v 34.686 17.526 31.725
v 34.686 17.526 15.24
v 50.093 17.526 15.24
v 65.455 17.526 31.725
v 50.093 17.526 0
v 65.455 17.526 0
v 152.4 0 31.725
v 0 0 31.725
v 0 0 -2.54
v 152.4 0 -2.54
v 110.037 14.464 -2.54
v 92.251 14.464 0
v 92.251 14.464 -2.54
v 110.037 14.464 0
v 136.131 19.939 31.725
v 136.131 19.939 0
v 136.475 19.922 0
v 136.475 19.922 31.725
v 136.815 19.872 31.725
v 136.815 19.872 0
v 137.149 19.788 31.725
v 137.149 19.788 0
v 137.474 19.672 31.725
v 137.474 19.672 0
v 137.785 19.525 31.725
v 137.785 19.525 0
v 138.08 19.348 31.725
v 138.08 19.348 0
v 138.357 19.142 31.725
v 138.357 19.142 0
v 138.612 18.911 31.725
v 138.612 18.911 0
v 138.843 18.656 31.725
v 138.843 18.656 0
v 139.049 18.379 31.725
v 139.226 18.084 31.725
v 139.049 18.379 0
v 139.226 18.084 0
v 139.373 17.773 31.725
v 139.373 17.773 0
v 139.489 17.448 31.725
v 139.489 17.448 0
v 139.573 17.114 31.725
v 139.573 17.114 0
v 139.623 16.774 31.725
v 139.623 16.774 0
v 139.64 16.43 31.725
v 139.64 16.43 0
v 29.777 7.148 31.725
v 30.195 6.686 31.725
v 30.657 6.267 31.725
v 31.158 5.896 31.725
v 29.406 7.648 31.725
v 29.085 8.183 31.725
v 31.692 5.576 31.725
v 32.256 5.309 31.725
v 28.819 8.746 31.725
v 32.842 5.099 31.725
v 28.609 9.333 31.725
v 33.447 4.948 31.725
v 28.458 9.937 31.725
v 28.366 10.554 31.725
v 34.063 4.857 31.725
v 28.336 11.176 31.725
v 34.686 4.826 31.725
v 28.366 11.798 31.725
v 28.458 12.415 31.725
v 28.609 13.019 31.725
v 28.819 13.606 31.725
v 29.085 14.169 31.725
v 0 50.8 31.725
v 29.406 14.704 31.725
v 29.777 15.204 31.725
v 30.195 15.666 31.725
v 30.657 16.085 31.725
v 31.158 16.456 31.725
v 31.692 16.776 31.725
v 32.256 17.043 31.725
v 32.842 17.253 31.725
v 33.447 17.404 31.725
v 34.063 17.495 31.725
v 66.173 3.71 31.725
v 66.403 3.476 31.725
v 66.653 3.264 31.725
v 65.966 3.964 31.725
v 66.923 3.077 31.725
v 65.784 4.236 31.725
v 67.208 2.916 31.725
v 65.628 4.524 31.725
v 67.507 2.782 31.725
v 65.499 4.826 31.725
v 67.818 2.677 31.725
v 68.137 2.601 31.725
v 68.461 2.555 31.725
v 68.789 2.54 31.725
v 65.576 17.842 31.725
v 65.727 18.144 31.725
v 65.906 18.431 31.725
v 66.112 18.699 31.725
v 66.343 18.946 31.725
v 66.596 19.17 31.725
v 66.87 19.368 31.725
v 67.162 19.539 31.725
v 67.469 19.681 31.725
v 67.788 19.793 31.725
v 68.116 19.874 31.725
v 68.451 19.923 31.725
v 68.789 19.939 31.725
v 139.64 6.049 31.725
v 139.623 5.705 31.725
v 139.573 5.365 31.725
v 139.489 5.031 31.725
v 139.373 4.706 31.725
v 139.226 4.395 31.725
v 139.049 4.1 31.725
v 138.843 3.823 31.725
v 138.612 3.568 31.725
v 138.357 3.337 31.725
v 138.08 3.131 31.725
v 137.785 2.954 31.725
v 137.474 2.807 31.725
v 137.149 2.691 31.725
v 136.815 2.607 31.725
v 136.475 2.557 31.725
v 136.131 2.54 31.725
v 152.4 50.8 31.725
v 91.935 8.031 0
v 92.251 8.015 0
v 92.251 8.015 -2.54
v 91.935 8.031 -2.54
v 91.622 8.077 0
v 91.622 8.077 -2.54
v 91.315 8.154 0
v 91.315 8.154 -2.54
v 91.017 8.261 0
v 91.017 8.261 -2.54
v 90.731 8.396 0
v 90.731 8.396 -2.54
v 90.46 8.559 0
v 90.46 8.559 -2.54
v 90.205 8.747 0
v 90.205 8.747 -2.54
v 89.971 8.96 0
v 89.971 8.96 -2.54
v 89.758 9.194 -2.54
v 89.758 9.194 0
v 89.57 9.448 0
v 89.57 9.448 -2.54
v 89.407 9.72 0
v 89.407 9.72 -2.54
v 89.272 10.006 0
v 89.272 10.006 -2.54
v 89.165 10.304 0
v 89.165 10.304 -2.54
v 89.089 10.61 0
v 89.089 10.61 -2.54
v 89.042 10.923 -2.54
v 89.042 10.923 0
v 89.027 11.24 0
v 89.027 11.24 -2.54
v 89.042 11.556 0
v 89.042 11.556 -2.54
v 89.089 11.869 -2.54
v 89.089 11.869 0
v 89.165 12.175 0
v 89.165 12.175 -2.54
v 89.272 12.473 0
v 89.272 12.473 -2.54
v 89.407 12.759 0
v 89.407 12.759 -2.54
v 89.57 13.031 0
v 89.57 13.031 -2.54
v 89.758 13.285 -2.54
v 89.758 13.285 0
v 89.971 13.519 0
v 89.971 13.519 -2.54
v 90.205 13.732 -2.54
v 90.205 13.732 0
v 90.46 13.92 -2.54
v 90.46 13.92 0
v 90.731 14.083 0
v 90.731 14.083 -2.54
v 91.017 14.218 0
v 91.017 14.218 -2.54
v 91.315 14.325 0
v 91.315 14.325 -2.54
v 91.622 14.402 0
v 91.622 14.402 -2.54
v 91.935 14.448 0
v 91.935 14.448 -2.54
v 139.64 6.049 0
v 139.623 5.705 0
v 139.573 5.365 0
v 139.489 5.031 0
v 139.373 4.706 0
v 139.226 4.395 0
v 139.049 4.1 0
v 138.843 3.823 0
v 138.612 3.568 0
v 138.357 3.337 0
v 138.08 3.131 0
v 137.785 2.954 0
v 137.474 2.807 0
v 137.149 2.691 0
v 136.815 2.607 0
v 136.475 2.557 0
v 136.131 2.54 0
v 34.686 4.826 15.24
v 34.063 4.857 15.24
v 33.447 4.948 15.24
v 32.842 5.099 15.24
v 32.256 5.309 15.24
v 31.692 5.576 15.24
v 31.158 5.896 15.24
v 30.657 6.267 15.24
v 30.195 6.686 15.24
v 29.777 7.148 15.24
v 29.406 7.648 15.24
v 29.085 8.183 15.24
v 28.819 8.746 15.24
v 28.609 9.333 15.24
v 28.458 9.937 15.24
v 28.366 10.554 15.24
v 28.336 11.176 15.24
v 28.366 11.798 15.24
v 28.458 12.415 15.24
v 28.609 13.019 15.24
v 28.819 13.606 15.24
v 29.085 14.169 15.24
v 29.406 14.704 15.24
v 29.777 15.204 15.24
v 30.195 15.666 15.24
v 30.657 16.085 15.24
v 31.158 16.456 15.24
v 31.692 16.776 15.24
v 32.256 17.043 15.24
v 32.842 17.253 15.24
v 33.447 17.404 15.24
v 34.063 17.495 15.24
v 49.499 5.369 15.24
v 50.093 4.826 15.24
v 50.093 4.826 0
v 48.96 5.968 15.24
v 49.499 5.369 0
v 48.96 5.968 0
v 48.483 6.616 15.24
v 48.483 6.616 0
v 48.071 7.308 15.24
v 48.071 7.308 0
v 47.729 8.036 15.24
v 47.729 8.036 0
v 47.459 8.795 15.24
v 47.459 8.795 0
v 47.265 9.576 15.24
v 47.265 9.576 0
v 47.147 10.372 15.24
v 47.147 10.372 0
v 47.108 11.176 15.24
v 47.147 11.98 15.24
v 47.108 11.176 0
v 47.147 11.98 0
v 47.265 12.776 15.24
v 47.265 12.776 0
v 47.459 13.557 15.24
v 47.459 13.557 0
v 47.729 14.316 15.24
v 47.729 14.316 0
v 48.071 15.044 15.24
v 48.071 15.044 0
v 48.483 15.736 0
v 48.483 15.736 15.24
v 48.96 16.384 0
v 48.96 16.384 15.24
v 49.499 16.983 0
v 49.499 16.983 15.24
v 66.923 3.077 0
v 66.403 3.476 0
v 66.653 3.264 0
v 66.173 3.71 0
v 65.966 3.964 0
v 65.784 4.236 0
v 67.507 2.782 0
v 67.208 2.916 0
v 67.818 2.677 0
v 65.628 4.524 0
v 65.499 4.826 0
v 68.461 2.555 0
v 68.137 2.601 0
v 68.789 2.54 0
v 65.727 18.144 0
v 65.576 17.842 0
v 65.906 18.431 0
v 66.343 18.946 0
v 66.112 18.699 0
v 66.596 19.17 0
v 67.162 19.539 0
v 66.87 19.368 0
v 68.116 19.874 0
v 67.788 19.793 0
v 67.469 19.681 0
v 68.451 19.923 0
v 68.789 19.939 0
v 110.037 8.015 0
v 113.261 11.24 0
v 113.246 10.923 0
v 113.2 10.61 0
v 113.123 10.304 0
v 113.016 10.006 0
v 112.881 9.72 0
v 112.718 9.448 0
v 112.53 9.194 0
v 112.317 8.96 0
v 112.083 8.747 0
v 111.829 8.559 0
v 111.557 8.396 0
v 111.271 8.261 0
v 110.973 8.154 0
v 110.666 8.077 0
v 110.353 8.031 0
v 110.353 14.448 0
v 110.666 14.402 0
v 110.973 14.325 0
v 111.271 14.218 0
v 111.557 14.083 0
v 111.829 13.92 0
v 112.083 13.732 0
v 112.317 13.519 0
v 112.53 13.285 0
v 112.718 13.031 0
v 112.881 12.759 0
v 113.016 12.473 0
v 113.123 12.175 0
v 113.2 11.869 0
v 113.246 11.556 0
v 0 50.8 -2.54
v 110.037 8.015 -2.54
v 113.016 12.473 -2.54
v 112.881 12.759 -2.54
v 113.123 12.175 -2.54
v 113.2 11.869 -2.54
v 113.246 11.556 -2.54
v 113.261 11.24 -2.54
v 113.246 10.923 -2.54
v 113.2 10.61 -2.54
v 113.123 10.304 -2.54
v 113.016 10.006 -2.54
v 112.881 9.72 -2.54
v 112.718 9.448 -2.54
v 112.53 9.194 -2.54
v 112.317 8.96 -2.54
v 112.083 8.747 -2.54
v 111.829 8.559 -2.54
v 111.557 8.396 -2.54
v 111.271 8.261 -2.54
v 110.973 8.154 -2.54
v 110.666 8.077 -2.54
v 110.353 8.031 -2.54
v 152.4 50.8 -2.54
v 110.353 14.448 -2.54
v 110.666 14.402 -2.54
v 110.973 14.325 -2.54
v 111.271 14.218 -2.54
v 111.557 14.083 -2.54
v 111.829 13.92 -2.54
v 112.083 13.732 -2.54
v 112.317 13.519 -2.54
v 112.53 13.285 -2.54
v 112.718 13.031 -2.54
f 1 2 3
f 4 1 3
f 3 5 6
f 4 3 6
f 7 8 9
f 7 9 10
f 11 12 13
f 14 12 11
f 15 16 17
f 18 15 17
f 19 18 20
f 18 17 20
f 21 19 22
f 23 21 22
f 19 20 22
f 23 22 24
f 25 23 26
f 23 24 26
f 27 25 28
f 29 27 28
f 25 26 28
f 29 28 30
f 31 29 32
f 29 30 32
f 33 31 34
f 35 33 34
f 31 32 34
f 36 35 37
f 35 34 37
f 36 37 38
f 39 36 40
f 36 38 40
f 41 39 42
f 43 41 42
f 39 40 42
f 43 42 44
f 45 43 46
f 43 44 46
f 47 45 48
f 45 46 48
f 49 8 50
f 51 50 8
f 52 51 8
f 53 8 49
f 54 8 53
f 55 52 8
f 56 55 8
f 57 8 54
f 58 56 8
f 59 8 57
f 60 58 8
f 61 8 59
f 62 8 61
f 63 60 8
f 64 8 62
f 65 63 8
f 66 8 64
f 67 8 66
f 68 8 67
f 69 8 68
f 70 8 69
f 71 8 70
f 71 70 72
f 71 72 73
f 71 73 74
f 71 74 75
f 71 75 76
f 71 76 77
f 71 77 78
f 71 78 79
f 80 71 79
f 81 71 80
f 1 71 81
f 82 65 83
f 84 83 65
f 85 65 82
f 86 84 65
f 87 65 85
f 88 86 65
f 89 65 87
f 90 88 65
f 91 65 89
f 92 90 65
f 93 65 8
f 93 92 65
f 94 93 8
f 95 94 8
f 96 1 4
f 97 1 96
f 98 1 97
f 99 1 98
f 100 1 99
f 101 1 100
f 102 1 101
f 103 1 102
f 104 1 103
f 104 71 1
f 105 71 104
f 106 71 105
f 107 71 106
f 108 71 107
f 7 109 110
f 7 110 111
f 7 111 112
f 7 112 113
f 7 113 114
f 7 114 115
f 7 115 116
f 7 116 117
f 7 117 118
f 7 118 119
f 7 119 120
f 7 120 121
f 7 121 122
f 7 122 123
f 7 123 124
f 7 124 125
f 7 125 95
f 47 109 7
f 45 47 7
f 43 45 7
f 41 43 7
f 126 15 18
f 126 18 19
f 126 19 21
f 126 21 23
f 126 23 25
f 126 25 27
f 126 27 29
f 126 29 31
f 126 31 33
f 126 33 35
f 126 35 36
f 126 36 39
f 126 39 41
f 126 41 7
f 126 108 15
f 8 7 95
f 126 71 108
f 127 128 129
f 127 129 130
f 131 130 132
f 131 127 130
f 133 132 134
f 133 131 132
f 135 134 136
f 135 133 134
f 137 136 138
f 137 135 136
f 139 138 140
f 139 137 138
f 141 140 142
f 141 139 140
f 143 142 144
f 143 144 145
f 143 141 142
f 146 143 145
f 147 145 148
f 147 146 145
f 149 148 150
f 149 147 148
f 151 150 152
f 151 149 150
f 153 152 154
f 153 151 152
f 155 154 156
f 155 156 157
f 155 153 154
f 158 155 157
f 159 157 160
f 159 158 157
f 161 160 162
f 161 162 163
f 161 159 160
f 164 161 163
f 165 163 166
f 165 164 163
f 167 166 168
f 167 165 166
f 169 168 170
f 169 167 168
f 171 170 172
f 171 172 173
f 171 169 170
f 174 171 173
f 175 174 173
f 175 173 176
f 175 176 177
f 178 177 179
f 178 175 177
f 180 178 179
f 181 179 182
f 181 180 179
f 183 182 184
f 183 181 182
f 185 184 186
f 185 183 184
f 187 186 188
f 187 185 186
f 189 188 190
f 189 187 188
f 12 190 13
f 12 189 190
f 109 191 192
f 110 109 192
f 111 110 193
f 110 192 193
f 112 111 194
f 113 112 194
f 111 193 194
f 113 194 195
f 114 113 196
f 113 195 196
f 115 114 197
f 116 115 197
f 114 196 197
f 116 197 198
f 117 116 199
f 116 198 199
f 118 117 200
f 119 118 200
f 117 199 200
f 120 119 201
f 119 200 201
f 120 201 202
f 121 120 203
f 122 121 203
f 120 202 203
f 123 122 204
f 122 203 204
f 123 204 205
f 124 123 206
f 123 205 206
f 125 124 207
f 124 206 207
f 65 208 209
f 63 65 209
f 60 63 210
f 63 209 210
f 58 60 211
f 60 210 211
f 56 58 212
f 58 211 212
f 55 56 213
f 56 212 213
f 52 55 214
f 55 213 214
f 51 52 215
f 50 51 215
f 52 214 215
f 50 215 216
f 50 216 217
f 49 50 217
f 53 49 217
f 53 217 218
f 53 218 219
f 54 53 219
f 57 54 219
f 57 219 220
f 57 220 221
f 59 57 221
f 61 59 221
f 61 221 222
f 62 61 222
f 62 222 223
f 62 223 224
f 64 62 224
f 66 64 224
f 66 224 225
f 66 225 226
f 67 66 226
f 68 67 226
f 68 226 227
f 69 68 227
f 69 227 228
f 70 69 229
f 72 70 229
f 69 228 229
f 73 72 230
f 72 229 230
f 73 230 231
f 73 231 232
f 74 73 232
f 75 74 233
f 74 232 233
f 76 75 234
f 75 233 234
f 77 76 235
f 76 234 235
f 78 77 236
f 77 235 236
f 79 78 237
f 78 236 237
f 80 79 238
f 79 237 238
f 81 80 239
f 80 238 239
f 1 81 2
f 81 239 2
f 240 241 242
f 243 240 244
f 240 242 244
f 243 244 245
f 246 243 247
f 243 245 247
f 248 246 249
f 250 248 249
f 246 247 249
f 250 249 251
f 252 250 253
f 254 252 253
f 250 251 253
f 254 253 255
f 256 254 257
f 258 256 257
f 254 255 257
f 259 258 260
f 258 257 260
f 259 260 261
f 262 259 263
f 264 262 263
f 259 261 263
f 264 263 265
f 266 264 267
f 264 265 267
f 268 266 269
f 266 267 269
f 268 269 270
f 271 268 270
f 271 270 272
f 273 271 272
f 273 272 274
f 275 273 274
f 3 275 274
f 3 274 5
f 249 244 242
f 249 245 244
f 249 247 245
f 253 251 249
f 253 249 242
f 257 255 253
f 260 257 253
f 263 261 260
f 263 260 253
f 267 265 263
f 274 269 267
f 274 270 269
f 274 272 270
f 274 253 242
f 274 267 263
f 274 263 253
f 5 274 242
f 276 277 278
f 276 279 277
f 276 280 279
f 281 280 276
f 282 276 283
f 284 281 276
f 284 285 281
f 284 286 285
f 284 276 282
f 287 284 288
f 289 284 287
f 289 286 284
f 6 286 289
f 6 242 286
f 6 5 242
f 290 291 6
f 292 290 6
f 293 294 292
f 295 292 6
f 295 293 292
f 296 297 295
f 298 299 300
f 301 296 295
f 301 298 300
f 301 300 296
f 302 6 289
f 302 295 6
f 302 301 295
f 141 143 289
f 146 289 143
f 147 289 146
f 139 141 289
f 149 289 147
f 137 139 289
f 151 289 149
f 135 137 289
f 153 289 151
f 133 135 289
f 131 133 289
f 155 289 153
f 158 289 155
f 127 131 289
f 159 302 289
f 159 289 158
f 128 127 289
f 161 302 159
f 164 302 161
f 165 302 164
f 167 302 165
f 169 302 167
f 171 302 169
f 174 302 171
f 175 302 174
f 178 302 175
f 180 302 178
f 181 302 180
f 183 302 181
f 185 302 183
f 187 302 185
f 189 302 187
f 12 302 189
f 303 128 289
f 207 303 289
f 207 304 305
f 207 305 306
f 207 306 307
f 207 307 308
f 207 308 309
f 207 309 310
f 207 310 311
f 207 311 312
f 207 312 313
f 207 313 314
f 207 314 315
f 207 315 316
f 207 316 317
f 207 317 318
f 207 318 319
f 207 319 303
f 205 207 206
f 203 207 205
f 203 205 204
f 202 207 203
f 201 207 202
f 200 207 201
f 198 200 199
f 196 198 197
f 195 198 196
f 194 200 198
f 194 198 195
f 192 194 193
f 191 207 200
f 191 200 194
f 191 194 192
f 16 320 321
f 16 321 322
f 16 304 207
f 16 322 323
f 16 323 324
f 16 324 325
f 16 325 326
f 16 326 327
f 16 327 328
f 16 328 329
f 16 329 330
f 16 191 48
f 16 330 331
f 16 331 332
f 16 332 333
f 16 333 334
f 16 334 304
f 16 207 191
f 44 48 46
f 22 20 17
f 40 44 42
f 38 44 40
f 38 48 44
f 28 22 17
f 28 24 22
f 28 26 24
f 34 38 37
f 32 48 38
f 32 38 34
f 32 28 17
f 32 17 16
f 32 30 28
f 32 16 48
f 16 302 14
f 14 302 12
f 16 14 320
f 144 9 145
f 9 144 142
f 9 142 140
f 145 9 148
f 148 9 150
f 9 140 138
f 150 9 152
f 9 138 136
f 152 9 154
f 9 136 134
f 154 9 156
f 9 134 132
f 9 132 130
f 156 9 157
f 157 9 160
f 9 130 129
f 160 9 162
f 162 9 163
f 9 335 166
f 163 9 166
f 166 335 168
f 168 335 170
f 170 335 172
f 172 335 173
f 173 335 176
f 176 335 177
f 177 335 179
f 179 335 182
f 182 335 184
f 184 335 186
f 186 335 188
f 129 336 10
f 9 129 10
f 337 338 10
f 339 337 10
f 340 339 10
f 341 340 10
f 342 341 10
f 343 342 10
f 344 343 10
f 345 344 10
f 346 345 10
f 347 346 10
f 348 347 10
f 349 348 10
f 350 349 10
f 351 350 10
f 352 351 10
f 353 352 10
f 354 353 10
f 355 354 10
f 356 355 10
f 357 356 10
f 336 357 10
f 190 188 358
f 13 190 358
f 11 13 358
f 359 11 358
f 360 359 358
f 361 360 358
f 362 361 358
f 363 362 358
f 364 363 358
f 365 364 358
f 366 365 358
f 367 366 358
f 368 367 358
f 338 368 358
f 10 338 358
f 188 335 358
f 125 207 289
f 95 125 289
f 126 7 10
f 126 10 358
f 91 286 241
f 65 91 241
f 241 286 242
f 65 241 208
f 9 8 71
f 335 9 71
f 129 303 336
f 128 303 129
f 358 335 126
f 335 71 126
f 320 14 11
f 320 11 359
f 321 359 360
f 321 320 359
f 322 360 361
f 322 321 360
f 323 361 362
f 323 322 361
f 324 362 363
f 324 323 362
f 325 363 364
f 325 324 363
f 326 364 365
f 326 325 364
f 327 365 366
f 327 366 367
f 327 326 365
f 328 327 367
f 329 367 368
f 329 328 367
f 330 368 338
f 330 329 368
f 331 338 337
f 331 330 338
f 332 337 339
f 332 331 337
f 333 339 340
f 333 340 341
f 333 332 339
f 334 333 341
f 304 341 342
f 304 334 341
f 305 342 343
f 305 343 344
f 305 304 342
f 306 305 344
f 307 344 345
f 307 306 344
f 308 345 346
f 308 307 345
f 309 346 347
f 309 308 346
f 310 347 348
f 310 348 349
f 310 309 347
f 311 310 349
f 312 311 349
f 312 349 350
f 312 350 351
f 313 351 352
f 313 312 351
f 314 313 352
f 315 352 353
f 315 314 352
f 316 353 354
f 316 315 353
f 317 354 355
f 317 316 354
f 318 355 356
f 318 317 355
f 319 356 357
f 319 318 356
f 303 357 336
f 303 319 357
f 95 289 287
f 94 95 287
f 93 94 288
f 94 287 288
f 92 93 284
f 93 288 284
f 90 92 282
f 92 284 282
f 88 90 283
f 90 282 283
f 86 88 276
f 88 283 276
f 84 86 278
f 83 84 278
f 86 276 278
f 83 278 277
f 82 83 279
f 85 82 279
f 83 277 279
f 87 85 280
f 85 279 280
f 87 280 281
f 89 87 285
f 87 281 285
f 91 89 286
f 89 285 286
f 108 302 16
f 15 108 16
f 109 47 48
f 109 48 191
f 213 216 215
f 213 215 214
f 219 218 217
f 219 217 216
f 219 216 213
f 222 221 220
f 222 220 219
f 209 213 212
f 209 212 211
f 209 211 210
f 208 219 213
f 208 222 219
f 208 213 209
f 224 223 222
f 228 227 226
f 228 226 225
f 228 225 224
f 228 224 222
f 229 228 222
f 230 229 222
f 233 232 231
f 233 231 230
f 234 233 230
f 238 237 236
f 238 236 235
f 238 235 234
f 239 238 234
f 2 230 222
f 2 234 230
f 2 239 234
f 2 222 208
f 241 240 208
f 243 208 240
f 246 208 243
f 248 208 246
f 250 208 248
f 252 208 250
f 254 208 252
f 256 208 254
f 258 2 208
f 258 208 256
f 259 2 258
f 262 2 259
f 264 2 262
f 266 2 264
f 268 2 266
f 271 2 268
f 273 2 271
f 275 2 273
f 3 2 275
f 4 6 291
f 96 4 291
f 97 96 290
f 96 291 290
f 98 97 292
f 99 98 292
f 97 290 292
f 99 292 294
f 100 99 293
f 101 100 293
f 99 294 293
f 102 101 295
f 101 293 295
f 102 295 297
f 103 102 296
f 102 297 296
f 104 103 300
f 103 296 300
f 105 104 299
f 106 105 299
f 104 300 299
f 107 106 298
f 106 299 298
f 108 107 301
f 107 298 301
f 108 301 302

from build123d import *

# Parameters (mm, degrees)
F0_W     = 152.4
F0_H     = 50.8
F1_DEPTH = 31.7246
F2_DEPTH = 2.54
F3_DEPTH = 15.24


# Not quite as in the source:
# - a feature names something its author has since deleted; it is built from what else it names


with BuildPart() as f1:
    # F0 (on Top) → F1 (new body)
    with BuildSketch(Plane.XY):
        with Locations((76.2, 25.4)):
            Rectangle(F0_W, F0_H)
        with BuildLine():
            Line((139.6399507581, 16.4298143223), (139.6399507581, 6.0491856777))
            ThreePointArc((139.6399507581, 6.0491856777), (138.6121340696, 3.5678166885), (136.1307650805, 2.54))
            Line((136.1307650805, 2.54), (68.7885385865, 2.54))
            ThreePointArc((68.7885385865, 2.54), (66.7857906668, 3.167626223), (65.4994352256, 4.826))
            Line((65.4994352256, 4.826), (50.0925188645, 4.826))
            Line((50.0925188645, 4.826), (34.6856025033, 4.826))
            ThreePointArc((34.6856025033, 4.826), (28.3356025033, 11.176), (34.6856025033, 17.526))
            Line((34.6856025033, 17.526), (50.0925188645, 17.526))
            Line((50.0925188645, 17.526), (65.4549577669, 17.526))
            ThreePointArc((65.4549577669, 17.526), (66.7309106998, 19.2724454275), (68.7885385865, 19.939))
            Line((68.7885385865, 19.939), (136.1307650805, 19.939))
            ThreePointArc((136.1307650805, 19.939), (138.6121340696, 18.9111833115), (139.6399507581, 16.4298143223))
        make_face(mode=Mode.SUBTRACT)
    extrude(amount=F1_DEPTH)

    # F0 (on Top) → F2 (join)
    with BuildSketch(Plane.XY):
        with Locations((76.2, 25.4)):
            Rectangle(F0_W, F0_H)
        with BuildLine():
            Line((139.6399507581, 16.4298143223), (139.6399507581, 6.0491856777))
            ThreePointArc((139.6399507581, 6.0491856777), (138.6121340696, 3.5678166885), (136.1307650805, 2.54))
            Line((136.1307650805, 2.54), (68.7885385865, 2.54))
            ThreePointArc((68.7885385865, 2.54), (66.7857906668, 3.167626223), (65.4994352256, 4.826))
            Line((65.4994352256, 4.826), (50.0925188645, 4.826))
            Line((50.0925188645, 4.826), (34.6856025033, 4.826))
            ThreePointArc((34.6856025033, 4.826), (28.3356025033, 11.176), (34.6856025033, 17.526))
            Line((34.6856025033, 17.526), (50.0925188645, 17.526))
            Line((50.0925188645, 17.526), (65.4549577669, 17.526))
            ThreePointArc((65.4549577669, 17.526), (66.7309106998, 19.2724454275), (68.7885385865, 19.939))
            Line((68.7885385865, 19.939), (136.1307650805, 19.939))
            ThreePointArc((136.1307650805, 19.939), (138.6121340696, 18.9111833115), (139.6399507581, 16.4298143223))
        make_face(mode=Mode.SUBTRACT)
        with BuildLine():
            ThreePointArc((136.1307650805, 2.54), (138.6121340696, 3.5678166885), (139.6399507581, 6.0491856777))
            Line((139.6399507581, 6.0491856777), (139.6399507581, 16.4298143223))
            ThreePointArc((139.6399507581, 16.4298143223), (138.6121340696, 18.9111833115), (136.1307650805, 19.939))
            Line((136.1307650805, 19.939), (68.7885385865, 19.939))
            ThreePointArc((68.7885385865, 19.939), (66.7309106998, 19.2724454275), (65.4549577669, 17.526))
            Line((65.4549577669, 17.526), (50.0925188645, 17.526))
            ThreePointArc((50.0925188645, 17.526), (47.107835886, 11.176), (50.0925188645, 4.826))
            Line((50.0925188645, 4.826), (65.4994352256, 4.826))
            ThreePointArc((65.4994352256, 4.826), (66.7857906668, 3.167626223), (68.7885385865, 2.54))
            Line((68.7885385865, 2.54), (136.1307650805, 2.54))
        make_face()
        with BuildLine():
            ThreePointArc((92.2508400636, 8.0152933773), (89.0266334409, 11.2395), (92.2508400636, 14.4637066227))
            Line((92.2508400636, 14.4637066227), (110.0372854958, 14.4637066227))
            ThreePointArc((110.0372854958, 14.4637066227), (113.2614921185, 11.2395), (110.0372854958, 8.0152933773))
            Line((110.0372854958, 8.0152933773), (92.2508400636, 8.0152933773))
        make_face(mode=Mode.SUBTRACT)
        with BuildLine():
            Line((34.6856025033, 4.826), (50.0925188645, 4.826))
            ThreePointArc((50.0925188645, 4.826), (47.107835886, 11.176), (50.0925188645, 17.526))
            Line((50.0925188645, 17.526), (34.6856025033, 17.526))
            ThreePointArc((34.6856025033, 17.526), (28.3356025033, 11.176), (34.6856025033, 4.826))
        make_face()
    extrude(amount=-F2_DEPTH)

    # F0 (on Top) → F3 (join)
    with BuildSketch(Plane.XY):
        with BuildLine():
            Line((34.6856025033, 4.826), (50.0925188645, 4.826))
            ThreePointArc((50.0925188645, 4.826), (47.107835886, 11.176), (50.0925188645, 17.526))
            Line((50.0925188645, 17.526), (34.6856025033, 17.526))
            ThreePointArc((34.6856025033, 17.526), (28.3356025033, 11.176), (34.6856025033, 4.826))
        make_face()
    extrude(amount=F3_DEPTH)


solid = f1.part
